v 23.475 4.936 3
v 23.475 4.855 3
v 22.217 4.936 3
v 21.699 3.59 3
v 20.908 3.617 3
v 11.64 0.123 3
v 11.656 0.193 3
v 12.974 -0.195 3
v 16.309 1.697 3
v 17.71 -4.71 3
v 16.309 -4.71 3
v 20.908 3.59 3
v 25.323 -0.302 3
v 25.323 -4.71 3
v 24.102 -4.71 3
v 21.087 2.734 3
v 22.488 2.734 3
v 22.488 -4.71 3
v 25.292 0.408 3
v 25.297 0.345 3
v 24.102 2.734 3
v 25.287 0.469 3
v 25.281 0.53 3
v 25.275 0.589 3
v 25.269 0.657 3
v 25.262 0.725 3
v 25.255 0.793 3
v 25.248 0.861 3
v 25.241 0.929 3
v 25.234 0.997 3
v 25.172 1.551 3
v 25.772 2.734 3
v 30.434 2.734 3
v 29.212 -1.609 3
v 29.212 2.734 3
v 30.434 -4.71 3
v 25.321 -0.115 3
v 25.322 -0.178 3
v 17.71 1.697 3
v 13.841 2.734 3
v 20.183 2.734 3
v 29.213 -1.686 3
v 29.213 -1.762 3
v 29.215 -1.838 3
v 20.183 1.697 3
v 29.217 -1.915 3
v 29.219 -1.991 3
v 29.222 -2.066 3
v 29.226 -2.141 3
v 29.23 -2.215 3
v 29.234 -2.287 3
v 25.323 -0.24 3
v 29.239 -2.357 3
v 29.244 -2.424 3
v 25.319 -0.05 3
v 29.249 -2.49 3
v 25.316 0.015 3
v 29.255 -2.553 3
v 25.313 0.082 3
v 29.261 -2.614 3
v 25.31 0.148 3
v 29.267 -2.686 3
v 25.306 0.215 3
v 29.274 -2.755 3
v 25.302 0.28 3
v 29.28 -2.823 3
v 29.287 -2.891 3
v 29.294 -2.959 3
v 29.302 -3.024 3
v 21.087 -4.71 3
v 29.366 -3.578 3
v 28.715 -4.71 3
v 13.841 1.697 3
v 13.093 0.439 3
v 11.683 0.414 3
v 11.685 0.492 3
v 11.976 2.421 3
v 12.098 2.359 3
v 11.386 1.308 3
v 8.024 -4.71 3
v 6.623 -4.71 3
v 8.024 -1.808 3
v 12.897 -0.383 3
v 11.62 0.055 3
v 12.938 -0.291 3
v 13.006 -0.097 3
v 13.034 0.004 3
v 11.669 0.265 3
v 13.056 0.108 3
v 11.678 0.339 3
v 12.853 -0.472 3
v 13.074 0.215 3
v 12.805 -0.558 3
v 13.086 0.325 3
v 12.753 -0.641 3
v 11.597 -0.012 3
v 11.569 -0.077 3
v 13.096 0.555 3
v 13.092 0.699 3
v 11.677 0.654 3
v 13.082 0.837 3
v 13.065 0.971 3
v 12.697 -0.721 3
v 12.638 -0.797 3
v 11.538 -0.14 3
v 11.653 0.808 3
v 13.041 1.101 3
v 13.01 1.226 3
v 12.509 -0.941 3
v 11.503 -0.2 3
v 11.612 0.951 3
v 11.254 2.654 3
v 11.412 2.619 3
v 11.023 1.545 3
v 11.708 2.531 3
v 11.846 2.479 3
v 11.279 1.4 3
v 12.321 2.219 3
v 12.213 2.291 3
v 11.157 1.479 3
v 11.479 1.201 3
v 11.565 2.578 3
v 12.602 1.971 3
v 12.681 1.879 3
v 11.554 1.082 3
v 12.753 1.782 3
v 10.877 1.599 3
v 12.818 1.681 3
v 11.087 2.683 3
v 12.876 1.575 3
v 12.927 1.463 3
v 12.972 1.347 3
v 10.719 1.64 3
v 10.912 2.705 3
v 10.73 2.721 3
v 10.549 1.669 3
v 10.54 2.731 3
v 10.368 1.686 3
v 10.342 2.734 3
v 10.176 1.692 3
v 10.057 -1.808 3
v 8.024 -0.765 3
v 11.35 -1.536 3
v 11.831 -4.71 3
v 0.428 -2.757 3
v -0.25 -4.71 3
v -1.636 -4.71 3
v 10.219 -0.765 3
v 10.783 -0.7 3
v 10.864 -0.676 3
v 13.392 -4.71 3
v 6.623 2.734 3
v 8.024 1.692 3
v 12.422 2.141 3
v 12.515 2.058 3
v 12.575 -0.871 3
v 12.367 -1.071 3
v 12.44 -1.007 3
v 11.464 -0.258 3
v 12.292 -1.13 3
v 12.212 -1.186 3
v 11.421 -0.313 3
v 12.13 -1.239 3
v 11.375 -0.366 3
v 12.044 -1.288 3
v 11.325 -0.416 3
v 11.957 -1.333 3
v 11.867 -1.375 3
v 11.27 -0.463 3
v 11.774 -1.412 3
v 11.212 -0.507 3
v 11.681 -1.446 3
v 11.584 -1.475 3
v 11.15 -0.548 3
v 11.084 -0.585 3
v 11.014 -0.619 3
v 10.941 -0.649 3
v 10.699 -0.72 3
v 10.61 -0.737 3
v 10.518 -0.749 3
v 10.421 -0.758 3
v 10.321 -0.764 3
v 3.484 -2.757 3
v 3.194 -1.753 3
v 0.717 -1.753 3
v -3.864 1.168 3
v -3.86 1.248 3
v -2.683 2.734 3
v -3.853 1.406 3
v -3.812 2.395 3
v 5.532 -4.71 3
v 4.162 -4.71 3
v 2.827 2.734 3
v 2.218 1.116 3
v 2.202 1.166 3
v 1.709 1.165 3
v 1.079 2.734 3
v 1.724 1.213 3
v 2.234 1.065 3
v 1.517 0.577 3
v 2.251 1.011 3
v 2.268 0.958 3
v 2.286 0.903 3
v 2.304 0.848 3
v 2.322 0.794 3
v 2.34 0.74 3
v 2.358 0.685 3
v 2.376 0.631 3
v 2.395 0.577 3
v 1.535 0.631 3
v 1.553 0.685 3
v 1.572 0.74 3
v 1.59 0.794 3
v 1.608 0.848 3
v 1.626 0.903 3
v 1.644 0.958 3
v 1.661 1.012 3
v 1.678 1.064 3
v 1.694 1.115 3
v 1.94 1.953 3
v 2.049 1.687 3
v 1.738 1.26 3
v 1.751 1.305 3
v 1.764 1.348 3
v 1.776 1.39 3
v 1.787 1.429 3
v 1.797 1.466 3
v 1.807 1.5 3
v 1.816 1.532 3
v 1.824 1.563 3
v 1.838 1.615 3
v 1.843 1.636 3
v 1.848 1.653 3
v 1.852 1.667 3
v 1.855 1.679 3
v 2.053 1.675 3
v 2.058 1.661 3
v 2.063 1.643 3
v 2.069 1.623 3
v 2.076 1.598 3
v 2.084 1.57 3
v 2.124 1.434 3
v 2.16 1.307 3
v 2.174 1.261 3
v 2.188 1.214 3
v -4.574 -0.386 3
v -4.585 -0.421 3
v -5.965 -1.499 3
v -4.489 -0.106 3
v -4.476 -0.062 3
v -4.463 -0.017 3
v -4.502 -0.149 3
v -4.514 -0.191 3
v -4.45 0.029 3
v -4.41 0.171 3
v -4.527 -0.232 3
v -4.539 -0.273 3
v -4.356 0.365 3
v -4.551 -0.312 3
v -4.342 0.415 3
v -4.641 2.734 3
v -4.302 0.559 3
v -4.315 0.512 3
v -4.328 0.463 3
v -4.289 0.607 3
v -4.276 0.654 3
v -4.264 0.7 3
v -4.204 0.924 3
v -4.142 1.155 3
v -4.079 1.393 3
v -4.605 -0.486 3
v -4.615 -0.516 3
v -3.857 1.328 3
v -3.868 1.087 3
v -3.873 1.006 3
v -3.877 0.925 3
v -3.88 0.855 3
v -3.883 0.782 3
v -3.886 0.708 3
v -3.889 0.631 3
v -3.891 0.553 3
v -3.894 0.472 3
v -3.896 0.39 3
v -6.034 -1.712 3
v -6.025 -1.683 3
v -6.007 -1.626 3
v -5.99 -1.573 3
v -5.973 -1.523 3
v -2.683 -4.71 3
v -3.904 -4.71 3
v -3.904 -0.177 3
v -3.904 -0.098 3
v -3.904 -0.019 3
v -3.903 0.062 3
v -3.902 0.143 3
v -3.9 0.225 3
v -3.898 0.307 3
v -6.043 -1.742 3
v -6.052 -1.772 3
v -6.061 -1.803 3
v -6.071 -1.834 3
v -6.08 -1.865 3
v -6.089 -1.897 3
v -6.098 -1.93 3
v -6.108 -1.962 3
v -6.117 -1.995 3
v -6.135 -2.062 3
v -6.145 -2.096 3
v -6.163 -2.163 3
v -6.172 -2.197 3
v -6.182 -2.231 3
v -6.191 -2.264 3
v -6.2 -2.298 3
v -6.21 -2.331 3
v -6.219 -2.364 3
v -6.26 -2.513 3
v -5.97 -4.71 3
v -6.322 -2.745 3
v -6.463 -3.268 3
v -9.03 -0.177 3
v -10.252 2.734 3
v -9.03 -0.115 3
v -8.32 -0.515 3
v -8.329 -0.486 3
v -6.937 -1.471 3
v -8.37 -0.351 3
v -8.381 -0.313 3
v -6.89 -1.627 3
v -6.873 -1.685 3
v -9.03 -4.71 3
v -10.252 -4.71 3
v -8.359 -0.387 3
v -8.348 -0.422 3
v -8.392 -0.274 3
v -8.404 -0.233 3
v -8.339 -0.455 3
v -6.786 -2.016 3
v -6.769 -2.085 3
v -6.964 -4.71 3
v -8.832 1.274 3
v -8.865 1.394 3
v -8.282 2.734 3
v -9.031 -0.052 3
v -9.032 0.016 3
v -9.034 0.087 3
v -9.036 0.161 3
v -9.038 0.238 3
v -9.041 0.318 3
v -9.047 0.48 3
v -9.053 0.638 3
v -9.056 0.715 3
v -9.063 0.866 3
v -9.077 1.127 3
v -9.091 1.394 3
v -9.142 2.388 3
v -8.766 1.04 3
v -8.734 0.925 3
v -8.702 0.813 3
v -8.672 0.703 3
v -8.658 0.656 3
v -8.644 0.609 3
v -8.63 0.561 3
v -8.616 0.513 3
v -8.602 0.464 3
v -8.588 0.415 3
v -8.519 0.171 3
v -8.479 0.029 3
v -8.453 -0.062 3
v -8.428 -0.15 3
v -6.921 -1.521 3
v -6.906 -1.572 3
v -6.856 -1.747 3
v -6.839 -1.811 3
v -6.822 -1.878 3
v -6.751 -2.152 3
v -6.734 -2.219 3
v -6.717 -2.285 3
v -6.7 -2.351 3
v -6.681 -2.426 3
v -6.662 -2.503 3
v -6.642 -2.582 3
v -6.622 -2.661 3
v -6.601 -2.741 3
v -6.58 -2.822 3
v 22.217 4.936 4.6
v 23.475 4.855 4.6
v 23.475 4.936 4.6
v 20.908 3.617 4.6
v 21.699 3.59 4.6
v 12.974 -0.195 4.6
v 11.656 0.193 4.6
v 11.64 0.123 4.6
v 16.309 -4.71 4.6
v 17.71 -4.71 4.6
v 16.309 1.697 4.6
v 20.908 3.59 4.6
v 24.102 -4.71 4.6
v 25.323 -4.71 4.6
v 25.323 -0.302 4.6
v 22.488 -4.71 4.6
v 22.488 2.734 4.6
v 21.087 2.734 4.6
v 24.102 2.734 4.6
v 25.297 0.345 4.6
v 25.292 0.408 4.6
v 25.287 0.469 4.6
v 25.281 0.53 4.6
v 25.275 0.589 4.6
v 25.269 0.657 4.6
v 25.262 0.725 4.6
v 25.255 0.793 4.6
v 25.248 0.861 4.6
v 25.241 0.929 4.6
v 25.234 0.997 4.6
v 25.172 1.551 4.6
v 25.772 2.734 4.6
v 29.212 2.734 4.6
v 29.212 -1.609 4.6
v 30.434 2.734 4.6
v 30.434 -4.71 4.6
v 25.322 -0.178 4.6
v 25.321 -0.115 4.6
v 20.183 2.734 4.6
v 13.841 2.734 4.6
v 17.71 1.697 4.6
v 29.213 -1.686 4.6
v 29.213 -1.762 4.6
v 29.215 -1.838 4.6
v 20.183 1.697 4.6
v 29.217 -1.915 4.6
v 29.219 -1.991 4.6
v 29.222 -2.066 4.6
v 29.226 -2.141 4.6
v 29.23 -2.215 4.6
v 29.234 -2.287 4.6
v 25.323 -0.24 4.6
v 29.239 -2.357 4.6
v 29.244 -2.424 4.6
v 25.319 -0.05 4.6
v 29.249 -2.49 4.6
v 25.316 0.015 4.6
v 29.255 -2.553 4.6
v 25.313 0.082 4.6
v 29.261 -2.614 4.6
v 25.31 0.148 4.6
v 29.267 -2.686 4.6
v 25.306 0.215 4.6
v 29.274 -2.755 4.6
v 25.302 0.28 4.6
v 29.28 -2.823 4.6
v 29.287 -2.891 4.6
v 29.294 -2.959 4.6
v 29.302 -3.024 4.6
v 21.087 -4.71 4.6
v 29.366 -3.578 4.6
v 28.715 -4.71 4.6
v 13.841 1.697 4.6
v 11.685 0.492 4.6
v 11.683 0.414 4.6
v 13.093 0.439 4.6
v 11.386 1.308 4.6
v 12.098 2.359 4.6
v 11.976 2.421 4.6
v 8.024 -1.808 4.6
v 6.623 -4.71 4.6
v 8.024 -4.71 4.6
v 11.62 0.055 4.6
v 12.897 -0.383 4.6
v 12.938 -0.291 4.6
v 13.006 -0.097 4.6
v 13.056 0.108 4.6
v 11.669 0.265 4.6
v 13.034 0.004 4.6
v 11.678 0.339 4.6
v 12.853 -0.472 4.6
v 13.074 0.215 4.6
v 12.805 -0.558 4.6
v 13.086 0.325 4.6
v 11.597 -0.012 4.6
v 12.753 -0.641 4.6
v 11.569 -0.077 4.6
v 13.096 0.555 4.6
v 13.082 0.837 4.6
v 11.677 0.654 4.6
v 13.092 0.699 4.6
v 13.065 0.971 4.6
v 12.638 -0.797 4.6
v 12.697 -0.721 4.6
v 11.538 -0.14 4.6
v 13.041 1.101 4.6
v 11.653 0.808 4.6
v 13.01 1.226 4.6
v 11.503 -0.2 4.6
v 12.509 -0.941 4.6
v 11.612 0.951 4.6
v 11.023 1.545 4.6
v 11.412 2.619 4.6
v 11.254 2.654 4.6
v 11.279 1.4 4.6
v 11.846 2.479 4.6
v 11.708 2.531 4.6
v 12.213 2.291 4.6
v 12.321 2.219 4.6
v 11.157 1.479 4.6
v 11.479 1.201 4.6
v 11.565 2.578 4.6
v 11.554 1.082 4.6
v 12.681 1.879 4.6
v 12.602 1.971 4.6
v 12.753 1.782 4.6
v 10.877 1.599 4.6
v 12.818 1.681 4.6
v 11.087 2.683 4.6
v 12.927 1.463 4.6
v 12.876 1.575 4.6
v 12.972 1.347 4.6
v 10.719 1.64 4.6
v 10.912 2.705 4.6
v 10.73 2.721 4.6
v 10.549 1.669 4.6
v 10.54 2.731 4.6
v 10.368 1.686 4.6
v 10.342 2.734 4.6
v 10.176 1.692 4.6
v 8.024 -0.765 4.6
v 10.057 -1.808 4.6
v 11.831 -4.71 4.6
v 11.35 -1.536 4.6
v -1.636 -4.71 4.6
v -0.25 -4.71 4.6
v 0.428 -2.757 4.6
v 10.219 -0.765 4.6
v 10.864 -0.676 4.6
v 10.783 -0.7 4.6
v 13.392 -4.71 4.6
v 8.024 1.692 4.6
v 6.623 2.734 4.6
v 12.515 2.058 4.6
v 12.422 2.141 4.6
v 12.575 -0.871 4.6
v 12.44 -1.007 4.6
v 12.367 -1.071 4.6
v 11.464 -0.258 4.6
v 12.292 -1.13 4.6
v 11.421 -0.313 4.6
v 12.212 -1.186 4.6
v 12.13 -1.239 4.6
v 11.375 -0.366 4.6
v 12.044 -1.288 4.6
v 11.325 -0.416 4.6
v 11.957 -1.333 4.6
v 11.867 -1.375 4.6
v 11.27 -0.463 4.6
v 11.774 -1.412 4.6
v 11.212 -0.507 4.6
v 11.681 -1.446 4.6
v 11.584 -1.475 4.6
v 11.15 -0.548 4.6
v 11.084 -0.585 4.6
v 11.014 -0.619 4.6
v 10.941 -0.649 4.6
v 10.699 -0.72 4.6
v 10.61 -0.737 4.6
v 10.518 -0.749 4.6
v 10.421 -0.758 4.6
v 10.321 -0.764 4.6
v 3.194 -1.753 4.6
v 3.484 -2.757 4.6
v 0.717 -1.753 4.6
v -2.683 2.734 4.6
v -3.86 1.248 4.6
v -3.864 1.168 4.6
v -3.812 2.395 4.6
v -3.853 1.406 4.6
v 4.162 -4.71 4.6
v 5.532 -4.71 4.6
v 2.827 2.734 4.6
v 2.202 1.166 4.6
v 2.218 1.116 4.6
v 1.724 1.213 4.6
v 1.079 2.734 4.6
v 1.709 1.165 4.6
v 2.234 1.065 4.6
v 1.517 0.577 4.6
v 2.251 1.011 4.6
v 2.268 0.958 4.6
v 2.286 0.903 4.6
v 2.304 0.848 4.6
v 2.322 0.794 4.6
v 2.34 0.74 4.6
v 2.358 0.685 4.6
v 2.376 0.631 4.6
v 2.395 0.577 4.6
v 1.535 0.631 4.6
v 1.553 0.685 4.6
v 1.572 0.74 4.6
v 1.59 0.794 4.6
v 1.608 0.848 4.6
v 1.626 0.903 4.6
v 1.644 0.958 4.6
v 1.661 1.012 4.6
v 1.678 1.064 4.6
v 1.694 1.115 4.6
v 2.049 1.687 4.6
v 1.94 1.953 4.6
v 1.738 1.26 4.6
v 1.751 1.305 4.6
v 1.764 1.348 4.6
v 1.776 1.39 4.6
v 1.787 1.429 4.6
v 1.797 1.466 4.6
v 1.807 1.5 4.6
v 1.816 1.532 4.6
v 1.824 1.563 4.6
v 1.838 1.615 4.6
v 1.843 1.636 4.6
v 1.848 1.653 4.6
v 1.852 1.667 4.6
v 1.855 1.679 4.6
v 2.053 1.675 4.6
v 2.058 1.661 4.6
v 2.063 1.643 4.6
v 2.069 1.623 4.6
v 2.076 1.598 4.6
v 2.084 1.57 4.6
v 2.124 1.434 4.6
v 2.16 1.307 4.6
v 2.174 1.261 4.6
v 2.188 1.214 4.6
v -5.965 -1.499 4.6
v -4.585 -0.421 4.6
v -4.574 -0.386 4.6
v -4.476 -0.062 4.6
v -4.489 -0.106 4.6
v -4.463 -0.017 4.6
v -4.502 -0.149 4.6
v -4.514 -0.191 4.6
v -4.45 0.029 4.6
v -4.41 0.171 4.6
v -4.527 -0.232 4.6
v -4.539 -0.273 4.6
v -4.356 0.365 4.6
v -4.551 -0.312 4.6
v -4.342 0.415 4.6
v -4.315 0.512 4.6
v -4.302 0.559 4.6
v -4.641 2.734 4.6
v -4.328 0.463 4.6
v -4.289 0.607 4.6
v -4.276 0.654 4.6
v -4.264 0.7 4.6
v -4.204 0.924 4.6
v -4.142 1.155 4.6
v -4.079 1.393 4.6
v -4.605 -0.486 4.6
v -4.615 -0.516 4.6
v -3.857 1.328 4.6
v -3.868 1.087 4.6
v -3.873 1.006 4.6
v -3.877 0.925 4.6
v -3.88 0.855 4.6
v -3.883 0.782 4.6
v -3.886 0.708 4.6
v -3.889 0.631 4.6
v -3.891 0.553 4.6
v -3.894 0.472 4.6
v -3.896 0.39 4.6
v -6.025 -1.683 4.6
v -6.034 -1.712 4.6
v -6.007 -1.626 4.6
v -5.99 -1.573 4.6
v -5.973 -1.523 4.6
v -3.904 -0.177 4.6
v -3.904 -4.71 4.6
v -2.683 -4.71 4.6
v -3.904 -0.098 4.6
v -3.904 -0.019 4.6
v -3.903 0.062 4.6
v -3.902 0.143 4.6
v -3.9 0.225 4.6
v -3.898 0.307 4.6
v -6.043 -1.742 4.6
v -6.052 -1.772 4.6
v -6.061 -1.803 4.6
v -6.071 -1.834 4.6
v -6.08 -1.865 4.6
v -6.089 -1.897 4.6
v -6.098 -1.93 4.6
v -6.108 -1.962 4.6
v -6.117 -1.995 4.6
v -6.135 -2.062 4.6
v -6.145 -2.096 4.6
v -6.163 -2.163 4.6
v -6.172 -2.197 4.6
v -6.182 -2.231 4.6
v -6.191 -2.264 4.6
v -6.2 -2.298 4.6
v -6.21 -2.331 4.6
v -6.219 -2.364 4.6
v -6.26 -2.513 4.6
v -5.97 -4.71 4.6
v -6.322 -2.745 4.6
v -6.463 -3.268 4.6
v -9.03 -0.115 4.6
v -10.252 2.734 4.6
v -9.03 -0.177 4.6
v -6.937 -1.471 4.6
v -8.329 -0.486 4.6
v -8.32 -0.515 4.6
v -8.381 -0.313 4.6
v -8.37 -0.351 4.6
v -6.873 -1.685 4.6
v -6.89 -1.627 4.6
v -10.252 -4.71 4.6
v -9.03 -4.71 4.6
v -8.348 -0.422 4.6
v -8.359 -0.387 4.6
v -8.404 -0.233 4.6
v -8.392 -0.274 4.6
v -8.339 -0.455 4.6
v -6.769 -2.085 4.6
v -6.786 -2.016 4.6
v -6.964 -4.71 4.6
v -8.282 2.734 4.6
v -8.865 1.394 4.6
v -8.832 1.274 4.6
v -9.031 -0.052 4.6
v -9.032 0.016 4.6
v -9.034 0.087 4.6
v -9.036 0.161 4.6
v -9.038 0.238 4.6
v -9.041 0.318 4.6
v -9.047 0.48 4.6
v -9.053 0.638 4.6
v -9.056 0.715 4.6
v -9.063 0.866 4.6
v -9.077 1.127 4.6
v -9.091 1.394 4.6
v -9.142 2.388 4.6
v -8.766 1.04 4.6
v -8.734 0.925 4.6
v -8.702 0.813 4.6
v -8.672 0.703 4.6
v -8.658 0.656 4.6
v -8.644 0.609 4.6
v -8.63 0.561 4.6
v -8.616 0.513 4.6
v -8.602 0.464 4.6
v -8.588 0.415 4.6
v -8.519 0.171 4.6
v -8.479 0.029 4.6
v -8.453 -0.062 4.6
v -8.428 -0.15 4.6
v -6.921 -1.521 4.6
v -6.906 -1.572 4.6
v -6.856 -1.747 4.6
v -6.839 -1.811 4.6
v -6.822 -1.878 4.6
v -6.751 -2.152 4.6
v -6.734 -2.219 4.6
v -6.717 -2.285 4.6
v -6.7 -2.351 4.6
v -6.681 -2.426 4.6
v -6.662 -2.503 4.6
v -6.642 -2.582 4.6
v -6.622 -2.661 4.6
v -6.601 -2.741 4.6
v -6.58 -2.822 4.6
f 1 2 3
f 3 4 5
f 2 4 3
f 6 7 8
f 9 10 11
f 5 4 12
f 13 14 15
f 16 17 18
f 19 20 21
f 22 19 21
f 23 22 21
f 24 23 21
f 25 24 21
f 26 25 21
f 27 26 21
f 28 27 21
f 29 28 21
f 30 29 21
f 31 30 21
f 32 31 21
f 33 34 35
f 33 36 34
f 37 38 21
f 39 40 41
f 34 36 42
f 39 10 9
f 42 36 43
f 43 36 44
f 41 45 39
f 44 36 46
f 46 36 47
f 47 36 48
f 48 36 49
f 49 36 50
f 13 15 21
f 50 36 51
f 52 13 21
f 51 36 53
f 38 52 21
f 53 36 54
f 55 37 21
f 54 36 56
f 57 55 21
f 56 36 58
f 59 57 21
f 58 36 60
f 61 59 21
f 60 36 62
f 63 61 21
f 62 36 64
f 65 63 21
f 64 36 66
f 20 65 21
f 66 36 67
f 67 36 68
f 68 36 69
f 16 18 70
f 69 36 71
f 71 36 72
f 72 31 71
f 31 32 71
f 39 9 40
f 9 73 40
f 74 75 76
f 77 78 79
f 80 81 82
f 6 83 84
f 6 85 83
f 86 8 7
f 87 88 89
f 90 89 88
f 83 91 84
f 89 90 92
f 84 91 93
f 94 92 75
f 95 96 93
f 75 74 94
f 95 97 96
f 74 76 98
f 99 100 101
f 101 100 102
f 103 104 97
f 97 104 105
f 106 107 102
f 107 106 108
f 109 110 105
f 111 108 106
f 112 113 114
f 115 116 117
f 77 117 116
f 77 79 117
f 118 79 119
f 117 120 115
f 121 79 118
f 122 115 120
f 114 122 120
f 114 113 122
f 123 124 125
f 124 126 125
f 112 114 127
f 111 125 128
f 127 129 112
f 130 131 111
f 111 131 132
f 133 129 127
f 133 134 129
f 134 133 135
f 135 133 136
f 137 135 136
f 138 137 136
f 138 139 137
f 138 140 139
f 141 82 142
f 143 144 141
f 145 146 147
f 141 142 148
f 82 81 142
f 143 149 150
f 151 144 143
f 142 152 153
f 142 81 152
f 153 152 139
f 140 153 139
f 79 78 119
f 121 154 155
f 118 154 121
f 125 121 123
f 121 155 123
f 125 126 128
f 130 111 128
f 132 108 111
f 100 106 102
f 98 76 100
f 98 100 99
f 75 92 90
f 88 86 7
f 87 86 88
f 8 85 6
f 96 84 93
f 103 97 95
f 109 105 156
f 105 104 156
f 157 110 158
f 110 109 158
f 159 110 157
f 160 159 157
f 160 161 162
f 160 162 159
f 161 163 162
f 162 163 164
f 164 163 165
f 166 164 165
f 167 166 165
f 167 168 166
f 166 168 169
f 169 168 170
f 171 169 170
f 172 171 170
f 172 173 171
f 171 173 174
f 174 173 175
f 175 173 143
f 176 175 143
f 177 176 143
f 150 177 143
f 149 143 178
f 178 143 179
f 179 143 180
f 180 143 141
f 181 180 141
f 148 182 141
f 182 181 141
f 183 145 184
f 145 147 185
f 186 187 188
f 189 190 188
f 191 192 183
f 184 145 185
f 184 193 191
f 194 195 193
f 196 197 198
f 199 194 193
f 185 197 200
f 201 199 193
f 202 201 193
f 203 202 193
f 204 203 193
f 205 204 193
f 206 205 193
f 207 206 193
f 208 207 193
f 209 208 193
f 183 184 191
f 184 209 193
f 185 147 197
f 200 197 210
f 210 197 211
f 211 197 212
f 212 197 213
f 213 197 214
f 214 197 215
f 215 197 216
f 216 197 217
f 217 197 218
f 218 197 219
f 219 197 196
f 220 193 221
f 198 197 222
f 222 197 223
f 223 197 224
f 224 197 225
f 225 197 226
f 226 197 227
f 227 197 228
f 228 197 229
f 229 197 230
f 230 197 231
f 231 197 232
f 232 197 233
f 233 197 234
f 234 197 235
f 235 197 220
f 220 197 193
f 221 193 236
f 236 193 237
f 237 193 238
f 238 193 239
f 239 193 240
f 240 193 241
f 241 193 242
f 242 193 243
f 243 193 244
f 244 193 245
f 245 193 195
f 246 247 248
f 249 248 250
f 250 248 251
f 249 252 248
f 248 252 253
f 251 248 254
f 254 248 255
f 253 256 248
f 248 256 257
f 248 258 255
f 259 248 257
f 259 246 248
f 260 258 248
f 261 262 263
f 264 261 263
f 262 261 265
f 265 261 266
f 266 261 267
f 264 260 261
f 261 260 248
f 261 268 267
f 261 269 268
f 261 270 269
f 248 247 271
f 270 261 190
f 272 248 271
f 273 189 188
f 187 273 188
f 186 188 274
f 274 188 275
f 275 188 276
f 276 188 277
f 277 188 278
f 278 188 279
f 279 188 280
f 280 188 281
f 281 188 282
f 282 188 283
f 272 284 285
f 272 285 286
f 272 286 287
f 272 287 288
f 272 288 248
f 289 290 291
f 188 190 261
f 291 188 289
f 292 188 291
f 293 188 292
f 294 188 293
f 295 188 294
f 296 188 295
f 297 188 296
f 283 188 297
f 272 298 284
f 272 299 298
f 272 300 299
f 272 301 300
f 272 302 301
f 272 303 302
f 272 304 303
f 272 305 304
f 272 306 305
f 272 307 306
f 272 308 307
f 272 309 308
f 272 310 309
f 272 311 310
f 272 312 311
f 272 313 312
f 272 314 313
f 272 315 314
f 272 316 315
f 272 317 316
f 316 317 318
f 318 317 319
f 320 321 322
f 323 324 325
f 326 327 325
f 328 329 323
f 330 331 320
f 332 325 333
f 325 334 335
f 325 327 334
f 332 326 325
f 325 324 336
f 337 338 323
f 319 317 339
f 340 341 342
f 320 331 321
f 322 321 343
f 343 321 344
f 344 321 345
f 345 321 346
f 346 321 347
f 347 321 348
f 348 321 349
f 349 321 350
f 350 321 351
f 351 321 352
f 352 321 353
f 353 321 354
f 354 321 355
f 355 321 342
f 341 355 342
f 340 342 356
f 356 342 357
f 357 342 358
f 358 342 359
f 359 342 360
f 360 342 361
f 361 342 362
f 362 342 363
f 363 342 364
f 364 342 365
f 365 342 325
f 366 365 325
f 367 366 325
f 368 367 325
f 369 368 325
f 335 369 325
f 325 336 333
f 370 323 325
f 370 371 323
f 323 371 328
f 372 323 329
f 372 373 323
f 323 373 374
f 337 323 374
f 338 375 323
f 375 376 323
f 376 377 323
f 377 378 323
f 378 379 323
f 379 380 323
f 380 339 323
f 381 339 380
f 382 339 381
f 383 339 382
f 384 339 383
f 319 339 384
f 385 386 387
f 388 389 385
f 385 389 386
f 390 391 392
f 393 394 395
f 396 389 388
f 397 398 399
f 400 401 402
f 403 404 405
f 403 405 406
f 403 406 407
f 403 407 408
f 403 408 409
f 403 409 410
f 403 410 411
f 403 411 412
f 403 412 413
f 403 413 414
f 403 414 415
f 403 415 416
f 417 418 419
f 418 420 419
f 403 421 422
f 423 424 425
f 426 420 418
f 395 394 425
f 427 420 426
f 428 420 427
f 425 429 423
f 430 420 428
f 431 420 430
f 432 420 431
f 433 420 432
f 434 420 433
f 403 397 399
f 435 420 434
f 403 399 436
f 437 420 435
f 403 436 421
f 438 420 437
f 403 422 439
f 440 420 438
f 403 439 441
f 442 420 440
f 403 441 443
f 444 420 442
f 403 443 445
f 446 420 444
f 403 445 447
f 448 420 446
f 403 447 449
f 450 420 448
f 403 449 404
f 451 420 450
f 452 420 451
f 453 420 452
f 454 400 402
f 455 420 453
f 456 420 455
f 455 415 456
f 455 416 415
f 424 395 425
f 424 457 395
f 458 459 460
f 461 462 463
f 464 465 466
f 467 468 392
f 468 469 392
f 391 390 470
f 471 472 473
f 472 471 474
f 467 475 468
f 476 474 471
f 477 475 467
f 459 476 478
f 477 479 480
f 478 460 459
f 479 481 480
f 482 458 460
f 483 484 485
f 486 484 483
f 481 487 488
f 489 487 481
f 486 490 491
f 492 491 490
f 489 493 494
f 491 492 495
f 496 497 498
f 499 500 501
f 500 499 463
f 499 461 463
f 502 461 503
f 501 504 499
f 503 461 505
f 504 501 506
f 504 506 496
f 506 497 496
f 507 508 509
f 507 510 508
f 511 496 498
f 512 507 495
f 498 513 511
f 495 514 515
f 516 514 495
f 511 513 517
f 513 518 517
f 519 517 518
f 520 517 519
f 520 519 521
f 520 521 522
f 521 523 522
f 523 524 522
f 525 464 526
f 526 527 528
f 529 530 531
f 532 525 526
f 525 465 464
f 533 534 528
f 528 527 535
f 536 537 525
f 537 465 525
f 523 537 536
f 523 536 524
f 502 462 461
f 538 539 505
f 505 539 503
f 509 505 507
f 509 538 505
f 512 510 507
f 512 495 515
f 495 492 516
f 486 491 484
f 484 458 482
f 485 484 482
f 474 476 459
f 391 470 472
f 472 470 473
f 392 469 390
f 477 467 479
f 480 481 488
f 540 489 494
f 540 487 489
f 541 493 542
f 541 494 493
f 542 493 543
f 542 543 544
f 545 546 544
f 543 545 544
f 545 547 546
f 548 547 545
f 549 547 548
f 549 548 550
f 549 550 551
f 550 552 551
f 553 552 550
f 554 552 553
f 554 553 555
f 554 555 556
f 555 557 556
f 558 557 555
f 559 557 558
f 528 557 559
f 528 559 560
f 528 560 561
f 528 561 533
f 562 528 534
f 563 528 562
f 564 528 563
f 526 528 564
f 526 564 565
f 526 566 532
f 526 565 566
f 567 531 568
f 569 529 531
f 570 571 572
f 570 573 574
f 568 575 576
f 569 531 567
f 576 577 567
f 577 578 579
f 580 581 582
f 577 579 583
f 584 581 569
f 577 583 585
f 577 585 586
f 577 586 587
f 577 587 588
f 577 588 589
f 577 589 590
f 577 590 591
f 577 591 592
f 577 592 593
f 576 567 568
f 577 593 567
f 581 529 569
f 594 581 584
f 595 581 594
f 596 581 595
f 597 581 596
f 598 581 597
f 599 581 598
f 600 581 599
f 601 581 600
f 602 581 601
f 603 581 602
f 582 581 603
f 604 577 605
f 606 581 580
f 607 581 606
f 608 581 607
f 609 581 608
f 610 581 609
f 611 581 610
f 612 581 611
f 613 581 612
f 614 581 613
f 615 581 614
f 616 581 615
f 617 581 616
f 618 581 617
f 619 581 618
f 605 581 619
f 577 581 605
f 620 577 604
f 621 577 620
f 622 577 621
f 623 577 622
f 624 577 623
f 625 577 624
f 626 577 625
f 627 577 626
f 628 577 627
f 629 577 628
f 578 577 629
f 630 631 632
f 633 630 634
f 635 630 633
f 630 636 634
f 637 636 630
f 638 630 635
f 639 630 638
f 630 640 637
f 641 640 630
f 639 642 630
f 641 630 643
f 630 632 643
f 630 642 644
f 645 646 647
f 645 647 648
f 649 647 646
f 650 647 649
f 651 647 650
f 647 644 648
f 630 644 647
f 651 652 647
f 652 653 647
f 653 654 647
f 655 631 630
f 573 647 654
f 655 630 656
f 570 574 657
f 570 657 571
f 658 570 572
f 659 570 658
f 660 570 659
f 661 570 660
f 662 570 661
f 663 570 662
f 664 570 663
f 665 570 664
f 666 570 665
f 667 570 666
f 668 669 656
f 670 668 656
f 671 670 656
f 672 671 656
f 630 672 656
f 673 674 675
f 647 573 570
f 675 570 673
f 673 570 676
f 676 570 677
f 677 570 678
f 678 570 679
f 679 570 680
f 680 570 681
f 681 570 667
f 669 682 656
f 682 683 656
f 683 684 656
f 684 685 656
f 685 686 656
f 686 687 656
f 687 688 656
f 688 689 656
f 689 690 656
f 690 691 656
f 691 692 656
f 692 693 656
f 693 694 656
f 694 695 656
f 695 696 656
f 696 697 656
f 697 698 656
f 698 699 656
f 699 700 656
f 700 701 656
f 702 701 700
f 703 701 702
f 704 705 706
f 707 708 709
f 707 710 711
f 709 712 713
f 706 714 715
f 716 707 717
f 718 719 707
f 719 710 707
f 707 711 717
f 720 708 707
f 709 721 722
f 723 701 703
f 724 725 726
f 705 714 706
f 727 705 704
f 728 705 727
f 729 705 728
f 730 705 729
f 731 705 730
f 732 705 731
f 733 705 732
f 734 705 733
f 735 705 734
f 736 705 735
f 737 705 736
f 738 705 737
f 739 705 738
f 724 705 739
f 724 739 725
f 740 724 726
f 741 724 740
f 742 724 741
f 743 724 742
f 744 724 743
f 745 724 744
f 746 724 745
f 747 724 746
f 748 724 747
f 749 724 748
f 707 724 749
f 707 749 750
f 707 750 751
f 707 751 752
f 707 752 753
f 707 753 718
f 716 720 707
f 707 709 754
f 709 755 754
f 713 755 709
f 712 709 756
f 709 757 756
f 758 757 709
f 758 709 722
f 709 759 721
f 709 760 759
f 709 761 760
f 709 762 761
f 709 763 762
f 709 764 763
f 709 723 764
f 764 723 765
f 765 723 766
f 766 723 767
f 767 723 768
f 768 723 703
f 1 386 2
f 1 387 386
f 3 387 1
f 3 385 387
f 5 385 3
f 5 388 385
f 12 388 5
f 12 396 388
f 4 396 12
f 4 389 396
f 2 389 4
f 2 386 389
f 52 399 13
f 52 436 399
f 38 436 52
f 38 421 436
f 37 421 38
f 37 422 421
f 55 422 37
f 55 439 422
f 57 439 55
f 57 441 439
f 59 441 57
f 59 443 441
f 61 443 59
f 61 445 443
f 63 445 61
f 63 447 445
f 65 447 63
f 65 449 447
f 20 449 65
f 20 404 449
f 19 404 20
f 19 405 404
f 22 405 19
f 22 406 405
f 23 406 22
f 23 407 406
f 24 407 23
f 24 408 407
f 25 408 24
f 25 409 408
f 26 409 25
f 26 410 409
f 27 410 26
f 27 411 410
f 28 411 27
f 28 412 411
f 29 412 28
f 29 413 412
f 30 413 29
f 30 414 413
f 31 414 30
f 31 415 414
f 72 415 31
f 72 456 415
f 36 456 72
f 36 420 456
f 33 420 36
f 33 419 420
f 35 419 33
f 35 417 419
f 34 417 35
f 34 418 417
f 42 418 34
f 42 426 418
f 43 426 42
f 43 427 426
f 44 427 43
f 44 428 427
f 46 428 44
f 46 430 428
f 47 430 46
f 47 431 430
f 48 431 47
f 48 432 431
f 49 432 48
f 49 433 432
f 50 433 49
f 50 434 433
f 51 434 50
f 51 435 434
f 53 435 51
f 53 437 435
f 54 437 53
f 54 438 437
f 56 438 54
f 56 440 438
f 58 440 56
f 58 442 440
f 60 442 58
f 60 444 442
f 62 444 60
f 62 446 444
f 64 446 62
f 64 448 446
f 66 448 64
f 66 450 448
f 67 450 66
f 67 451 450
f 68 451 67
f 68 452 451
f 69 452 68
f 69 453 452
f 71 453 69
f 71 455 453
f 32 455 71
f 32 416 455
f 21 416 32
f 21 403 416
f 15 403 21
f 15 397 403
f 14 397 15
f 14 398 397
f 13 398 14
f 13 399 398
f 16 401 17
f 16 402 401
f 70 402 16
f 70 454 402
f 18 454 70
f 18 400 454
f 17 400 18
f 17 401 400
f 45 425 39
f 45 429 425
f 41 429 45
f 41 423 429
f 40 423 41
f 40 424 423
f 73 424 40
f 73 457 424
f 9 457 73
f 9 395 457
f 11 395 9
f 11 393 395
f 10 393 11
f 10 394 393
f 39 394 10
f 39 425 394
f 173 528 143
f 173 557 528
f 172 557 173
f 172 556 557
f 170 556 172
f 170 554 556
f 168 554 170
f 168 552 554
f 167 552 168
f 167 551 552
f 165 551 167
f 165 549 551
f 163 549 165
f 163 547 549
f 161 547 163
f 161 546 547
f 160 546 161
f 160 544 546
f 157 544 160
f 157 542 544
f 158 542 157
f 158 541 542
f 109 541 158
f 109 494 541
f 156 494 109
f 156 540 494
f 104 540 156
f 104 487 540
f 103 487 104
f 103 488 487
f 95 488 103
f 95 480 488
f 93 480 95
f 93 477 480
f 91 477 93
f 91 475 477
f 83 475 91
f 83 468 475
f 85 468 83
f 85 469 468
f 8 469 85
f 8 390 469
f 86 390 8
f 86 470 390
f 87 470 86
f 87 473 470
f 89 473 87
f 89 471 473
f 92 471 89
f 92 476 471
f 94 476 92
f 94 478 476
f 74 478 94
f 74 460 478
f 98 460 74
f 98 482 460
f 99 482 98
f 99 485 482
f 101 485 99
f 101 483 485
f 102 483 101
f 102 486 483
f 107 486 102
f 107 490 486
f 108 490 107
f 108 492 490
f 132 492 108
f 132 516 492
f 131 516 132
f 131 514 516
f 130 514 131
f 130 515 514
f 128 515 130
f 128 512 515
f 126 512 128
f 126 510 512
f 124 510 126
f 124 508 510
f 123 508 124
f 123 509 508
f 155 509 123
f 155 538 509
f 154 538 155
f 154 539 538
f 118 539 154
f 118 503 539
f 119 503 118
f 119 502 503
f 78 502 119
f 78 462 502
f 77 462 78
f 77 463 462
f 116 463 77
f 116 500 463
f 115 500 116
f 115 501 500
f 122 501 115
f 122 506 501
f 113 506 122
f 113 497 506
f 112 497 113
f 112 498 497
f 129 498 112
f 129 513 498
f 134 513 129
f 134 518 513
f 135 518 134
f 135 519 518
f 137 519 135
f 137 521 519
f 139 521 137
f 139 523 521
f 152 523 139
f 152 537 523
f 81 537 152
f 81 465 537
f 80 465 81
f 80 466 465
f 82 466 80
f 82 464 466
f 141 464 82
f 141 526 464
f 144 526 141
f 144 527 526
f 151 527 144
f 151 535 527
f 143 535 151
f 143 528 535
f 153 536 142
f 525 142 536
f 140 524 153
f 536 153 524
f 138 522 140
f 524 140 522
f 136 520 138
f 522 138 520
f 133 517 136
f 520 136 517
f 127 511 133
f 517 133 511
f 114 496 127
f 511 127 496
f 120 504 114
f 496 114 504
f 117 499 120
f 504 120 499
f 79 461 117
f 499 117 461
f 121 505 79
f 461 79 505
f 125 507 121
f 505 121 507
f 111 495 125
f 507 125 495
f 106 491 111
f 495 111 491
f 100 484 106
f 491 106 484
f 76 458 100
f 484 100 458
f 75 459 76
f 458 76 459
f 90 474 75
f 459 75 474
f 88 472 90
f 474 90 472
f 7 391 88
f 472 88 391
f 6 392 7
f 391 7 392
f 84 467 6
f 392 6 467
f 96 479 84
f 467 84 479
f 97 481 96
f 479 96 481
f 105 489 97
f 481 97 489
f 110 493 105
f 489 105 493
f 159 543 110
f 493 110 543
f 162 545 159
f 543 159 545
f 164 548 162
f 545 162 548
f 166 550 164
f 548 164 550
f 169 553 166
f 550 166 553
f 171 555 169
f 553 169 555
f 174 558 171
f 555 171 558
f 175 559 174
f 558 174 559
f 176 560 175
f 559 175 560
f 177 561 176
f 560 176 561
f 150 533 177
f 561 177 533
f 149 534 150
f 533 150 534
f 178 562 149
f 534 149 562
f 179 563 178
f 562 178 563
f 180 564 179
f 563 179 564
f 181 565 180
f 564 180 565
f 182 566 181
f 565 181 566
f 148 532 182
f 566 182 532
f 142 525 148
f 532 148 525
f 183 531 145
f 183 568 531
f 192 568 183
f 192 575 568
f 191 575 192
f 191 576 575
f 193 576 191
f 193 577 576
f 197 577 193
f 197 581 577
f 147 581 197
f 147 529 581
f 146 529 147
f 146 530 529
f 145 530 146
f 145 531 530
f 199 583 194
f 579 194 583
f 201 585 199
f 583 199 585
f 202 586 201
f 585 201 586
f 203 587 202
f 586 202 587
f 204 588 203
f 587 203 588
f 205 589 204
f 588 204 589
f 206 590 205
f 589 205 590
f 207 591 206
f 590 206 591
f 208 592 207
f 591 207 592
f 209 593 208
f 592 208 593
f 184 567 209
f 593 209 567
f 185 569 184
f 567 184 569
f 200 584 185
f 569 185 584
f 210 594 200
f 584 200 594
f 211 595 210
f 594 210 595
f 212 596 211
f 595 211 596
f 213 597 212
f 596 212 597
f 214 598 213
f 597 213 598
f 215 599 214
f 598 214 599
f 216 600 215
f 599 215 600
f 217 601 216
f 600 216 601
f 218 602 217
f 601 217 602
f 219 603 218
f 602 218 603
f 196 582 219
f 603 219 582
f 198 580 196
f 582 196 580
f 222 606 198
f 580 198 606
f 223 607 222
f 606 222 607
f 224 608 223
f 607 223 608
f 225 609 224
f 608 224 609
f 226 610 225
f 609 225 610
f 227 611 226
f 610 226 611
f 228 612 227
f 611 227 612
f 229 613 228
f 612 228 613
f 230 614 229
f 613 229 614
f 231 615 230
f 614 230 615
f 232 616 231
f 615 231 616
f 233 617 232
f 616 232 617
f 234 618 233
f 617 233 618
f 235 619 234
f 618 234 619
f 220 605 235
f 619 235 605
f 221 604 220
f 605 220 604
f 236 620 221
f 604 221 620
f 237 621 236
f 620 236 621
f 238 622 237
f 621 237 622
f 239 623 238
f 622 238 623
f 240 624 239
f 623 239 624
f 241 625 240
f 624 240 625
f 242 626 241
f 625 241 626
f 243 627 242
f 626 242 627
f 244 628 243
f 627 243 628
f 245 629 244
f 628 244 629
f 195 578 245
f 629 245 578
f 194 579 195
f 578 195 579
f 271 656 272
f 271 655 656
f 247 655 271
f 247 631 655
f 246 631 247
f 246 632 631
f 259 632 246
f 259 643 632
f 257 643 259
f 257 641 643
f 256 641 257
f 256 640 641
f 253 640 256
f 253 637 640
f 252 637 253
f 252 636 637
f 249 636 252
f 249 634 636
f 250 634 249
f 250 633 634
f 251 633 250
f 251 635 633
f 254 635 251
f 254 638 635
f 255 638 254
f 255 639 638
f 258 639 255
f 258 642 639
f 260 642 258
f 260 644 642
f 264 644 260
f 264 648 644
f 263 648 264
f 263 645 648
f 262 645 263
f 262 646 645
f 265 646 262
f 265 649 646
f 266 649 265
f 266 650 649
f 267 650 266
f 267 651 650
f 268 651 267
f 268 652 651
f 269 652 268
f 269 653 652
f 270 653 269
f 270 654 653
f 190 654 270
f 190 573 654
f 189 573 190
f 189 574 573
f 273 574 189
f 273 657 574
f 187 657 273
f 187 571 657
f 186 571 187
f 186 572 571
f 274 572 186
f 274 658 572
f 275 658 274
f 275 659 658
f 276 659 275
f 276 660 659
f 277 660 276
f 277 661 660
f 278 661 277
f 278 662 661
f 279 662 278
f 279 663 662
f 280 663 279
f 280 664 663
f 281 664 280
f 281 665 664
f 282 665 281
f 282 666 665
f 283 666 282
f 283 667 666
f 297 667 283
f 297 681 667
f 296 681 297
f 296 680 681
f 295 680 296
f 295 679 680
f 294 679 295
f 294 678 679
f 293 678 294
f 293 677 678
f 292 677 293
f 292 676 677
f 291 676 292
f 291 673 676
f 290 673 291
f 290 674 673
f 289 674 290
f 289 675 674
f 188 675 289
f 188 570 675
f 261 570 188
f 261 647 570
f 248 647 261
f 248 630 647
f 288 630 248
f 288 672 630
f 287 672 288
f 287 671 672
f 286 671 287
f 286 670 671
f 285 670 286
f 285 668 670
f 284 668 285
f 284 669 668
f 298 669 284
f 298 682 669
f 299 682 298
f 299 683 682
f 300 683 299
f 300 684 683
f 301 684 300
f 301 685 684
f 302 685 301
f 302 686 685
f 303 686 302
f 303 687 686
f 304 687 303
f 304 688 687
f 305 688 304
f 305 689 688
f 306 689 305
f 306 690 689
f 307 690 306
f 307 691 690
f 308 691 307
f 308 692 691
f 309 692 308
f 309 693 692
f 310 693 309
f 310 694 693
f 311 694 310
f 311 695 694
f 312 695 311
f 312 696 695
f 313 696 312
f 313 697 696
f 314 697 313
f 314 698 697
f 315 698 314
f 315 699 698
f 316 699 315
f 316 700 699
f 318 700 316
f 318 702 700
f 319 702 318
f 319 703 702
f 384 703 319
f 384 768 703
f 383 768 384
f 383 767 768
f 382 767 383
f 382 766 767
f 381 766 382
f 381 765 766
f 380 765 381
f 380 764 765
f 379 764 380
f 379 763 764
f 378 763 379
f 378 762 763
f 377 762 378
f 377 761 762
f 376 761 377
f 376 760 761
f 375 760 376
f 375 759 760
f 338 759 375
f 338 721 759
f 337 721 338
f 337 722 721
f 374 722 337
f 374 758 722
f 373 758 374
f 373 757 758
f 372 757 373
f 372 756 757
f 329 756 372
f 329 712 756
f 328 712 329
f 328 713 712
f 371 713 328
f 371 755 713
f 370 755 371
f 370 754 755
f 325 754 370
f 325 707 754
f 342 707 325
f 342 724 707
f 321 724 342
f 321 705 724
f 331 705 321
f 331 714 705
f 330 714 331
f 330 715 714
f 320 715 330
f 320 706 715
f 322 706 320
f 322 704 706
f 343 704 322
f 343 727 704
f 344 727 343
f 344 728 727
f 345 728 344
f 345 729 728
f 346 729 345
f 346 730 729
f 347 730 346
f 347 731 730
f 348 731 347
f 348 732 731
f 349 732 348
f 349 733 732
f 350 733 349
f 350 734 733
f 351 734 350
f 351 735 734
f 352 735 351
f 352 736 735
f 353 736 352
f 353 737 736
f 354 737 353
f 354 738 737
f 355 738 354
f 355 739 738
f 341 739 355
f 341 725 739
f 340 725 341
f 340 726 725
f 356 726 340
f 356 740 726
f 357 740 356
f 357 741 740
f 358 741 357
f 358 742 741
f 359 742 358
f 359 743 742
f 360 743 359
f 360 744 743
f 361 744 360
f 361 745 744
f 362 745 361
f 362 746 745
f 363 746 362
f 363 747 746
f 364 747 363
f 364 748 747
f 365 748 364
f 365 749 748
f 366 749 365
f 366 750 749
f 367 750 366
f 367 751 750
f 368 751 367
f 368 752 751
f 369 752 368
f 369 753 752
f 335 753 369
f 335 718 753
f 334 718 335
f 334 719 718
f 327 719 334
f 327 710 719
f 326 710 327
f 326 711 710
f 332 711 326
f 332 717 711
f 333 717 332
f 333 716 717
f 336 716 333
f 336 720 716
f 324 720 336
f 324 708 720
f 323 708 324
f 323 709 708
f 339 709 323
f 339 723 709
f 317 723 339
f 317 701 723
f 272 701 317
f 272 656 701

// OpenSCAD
// file: comun.scad
// GolfCraft3D — Etiqueta de bolsa con nombre (diseño propio, 2 colores). Pelota con hoyuelos en relieve, el nombre
// del jugador y ranura para la correa. Se imprime acostada, sin soportes.
nombre = "MARTÍN";
w = 98; h = 52; esp = 4;
$fn = 48;
module placa() hull() for (x = [-w / 2 + 8, w / 2 - 8], y = [-h / 2 + 8, h / 2 - 8]) translate([x, y]) circle(r = 8);
module hoyuelos() for (r = [0, 5, 10], k = [0:max(1, r * 0.9) - 1]) let(a = 360 * k / max(1, round(r * 0.9))) translate([r * cos(a), r * sin(a)]) circle(d = 2.6, $fn = 12);
module texto() text(nombre, size = 8, halign = "center", valign = "center", font = "Liberation Sans:style=Bold");
// main file
include <comun.scad>
translate([10, 0, esp - 1]) linear_extrude(1.6) offset(delta = -0.1) texto();
